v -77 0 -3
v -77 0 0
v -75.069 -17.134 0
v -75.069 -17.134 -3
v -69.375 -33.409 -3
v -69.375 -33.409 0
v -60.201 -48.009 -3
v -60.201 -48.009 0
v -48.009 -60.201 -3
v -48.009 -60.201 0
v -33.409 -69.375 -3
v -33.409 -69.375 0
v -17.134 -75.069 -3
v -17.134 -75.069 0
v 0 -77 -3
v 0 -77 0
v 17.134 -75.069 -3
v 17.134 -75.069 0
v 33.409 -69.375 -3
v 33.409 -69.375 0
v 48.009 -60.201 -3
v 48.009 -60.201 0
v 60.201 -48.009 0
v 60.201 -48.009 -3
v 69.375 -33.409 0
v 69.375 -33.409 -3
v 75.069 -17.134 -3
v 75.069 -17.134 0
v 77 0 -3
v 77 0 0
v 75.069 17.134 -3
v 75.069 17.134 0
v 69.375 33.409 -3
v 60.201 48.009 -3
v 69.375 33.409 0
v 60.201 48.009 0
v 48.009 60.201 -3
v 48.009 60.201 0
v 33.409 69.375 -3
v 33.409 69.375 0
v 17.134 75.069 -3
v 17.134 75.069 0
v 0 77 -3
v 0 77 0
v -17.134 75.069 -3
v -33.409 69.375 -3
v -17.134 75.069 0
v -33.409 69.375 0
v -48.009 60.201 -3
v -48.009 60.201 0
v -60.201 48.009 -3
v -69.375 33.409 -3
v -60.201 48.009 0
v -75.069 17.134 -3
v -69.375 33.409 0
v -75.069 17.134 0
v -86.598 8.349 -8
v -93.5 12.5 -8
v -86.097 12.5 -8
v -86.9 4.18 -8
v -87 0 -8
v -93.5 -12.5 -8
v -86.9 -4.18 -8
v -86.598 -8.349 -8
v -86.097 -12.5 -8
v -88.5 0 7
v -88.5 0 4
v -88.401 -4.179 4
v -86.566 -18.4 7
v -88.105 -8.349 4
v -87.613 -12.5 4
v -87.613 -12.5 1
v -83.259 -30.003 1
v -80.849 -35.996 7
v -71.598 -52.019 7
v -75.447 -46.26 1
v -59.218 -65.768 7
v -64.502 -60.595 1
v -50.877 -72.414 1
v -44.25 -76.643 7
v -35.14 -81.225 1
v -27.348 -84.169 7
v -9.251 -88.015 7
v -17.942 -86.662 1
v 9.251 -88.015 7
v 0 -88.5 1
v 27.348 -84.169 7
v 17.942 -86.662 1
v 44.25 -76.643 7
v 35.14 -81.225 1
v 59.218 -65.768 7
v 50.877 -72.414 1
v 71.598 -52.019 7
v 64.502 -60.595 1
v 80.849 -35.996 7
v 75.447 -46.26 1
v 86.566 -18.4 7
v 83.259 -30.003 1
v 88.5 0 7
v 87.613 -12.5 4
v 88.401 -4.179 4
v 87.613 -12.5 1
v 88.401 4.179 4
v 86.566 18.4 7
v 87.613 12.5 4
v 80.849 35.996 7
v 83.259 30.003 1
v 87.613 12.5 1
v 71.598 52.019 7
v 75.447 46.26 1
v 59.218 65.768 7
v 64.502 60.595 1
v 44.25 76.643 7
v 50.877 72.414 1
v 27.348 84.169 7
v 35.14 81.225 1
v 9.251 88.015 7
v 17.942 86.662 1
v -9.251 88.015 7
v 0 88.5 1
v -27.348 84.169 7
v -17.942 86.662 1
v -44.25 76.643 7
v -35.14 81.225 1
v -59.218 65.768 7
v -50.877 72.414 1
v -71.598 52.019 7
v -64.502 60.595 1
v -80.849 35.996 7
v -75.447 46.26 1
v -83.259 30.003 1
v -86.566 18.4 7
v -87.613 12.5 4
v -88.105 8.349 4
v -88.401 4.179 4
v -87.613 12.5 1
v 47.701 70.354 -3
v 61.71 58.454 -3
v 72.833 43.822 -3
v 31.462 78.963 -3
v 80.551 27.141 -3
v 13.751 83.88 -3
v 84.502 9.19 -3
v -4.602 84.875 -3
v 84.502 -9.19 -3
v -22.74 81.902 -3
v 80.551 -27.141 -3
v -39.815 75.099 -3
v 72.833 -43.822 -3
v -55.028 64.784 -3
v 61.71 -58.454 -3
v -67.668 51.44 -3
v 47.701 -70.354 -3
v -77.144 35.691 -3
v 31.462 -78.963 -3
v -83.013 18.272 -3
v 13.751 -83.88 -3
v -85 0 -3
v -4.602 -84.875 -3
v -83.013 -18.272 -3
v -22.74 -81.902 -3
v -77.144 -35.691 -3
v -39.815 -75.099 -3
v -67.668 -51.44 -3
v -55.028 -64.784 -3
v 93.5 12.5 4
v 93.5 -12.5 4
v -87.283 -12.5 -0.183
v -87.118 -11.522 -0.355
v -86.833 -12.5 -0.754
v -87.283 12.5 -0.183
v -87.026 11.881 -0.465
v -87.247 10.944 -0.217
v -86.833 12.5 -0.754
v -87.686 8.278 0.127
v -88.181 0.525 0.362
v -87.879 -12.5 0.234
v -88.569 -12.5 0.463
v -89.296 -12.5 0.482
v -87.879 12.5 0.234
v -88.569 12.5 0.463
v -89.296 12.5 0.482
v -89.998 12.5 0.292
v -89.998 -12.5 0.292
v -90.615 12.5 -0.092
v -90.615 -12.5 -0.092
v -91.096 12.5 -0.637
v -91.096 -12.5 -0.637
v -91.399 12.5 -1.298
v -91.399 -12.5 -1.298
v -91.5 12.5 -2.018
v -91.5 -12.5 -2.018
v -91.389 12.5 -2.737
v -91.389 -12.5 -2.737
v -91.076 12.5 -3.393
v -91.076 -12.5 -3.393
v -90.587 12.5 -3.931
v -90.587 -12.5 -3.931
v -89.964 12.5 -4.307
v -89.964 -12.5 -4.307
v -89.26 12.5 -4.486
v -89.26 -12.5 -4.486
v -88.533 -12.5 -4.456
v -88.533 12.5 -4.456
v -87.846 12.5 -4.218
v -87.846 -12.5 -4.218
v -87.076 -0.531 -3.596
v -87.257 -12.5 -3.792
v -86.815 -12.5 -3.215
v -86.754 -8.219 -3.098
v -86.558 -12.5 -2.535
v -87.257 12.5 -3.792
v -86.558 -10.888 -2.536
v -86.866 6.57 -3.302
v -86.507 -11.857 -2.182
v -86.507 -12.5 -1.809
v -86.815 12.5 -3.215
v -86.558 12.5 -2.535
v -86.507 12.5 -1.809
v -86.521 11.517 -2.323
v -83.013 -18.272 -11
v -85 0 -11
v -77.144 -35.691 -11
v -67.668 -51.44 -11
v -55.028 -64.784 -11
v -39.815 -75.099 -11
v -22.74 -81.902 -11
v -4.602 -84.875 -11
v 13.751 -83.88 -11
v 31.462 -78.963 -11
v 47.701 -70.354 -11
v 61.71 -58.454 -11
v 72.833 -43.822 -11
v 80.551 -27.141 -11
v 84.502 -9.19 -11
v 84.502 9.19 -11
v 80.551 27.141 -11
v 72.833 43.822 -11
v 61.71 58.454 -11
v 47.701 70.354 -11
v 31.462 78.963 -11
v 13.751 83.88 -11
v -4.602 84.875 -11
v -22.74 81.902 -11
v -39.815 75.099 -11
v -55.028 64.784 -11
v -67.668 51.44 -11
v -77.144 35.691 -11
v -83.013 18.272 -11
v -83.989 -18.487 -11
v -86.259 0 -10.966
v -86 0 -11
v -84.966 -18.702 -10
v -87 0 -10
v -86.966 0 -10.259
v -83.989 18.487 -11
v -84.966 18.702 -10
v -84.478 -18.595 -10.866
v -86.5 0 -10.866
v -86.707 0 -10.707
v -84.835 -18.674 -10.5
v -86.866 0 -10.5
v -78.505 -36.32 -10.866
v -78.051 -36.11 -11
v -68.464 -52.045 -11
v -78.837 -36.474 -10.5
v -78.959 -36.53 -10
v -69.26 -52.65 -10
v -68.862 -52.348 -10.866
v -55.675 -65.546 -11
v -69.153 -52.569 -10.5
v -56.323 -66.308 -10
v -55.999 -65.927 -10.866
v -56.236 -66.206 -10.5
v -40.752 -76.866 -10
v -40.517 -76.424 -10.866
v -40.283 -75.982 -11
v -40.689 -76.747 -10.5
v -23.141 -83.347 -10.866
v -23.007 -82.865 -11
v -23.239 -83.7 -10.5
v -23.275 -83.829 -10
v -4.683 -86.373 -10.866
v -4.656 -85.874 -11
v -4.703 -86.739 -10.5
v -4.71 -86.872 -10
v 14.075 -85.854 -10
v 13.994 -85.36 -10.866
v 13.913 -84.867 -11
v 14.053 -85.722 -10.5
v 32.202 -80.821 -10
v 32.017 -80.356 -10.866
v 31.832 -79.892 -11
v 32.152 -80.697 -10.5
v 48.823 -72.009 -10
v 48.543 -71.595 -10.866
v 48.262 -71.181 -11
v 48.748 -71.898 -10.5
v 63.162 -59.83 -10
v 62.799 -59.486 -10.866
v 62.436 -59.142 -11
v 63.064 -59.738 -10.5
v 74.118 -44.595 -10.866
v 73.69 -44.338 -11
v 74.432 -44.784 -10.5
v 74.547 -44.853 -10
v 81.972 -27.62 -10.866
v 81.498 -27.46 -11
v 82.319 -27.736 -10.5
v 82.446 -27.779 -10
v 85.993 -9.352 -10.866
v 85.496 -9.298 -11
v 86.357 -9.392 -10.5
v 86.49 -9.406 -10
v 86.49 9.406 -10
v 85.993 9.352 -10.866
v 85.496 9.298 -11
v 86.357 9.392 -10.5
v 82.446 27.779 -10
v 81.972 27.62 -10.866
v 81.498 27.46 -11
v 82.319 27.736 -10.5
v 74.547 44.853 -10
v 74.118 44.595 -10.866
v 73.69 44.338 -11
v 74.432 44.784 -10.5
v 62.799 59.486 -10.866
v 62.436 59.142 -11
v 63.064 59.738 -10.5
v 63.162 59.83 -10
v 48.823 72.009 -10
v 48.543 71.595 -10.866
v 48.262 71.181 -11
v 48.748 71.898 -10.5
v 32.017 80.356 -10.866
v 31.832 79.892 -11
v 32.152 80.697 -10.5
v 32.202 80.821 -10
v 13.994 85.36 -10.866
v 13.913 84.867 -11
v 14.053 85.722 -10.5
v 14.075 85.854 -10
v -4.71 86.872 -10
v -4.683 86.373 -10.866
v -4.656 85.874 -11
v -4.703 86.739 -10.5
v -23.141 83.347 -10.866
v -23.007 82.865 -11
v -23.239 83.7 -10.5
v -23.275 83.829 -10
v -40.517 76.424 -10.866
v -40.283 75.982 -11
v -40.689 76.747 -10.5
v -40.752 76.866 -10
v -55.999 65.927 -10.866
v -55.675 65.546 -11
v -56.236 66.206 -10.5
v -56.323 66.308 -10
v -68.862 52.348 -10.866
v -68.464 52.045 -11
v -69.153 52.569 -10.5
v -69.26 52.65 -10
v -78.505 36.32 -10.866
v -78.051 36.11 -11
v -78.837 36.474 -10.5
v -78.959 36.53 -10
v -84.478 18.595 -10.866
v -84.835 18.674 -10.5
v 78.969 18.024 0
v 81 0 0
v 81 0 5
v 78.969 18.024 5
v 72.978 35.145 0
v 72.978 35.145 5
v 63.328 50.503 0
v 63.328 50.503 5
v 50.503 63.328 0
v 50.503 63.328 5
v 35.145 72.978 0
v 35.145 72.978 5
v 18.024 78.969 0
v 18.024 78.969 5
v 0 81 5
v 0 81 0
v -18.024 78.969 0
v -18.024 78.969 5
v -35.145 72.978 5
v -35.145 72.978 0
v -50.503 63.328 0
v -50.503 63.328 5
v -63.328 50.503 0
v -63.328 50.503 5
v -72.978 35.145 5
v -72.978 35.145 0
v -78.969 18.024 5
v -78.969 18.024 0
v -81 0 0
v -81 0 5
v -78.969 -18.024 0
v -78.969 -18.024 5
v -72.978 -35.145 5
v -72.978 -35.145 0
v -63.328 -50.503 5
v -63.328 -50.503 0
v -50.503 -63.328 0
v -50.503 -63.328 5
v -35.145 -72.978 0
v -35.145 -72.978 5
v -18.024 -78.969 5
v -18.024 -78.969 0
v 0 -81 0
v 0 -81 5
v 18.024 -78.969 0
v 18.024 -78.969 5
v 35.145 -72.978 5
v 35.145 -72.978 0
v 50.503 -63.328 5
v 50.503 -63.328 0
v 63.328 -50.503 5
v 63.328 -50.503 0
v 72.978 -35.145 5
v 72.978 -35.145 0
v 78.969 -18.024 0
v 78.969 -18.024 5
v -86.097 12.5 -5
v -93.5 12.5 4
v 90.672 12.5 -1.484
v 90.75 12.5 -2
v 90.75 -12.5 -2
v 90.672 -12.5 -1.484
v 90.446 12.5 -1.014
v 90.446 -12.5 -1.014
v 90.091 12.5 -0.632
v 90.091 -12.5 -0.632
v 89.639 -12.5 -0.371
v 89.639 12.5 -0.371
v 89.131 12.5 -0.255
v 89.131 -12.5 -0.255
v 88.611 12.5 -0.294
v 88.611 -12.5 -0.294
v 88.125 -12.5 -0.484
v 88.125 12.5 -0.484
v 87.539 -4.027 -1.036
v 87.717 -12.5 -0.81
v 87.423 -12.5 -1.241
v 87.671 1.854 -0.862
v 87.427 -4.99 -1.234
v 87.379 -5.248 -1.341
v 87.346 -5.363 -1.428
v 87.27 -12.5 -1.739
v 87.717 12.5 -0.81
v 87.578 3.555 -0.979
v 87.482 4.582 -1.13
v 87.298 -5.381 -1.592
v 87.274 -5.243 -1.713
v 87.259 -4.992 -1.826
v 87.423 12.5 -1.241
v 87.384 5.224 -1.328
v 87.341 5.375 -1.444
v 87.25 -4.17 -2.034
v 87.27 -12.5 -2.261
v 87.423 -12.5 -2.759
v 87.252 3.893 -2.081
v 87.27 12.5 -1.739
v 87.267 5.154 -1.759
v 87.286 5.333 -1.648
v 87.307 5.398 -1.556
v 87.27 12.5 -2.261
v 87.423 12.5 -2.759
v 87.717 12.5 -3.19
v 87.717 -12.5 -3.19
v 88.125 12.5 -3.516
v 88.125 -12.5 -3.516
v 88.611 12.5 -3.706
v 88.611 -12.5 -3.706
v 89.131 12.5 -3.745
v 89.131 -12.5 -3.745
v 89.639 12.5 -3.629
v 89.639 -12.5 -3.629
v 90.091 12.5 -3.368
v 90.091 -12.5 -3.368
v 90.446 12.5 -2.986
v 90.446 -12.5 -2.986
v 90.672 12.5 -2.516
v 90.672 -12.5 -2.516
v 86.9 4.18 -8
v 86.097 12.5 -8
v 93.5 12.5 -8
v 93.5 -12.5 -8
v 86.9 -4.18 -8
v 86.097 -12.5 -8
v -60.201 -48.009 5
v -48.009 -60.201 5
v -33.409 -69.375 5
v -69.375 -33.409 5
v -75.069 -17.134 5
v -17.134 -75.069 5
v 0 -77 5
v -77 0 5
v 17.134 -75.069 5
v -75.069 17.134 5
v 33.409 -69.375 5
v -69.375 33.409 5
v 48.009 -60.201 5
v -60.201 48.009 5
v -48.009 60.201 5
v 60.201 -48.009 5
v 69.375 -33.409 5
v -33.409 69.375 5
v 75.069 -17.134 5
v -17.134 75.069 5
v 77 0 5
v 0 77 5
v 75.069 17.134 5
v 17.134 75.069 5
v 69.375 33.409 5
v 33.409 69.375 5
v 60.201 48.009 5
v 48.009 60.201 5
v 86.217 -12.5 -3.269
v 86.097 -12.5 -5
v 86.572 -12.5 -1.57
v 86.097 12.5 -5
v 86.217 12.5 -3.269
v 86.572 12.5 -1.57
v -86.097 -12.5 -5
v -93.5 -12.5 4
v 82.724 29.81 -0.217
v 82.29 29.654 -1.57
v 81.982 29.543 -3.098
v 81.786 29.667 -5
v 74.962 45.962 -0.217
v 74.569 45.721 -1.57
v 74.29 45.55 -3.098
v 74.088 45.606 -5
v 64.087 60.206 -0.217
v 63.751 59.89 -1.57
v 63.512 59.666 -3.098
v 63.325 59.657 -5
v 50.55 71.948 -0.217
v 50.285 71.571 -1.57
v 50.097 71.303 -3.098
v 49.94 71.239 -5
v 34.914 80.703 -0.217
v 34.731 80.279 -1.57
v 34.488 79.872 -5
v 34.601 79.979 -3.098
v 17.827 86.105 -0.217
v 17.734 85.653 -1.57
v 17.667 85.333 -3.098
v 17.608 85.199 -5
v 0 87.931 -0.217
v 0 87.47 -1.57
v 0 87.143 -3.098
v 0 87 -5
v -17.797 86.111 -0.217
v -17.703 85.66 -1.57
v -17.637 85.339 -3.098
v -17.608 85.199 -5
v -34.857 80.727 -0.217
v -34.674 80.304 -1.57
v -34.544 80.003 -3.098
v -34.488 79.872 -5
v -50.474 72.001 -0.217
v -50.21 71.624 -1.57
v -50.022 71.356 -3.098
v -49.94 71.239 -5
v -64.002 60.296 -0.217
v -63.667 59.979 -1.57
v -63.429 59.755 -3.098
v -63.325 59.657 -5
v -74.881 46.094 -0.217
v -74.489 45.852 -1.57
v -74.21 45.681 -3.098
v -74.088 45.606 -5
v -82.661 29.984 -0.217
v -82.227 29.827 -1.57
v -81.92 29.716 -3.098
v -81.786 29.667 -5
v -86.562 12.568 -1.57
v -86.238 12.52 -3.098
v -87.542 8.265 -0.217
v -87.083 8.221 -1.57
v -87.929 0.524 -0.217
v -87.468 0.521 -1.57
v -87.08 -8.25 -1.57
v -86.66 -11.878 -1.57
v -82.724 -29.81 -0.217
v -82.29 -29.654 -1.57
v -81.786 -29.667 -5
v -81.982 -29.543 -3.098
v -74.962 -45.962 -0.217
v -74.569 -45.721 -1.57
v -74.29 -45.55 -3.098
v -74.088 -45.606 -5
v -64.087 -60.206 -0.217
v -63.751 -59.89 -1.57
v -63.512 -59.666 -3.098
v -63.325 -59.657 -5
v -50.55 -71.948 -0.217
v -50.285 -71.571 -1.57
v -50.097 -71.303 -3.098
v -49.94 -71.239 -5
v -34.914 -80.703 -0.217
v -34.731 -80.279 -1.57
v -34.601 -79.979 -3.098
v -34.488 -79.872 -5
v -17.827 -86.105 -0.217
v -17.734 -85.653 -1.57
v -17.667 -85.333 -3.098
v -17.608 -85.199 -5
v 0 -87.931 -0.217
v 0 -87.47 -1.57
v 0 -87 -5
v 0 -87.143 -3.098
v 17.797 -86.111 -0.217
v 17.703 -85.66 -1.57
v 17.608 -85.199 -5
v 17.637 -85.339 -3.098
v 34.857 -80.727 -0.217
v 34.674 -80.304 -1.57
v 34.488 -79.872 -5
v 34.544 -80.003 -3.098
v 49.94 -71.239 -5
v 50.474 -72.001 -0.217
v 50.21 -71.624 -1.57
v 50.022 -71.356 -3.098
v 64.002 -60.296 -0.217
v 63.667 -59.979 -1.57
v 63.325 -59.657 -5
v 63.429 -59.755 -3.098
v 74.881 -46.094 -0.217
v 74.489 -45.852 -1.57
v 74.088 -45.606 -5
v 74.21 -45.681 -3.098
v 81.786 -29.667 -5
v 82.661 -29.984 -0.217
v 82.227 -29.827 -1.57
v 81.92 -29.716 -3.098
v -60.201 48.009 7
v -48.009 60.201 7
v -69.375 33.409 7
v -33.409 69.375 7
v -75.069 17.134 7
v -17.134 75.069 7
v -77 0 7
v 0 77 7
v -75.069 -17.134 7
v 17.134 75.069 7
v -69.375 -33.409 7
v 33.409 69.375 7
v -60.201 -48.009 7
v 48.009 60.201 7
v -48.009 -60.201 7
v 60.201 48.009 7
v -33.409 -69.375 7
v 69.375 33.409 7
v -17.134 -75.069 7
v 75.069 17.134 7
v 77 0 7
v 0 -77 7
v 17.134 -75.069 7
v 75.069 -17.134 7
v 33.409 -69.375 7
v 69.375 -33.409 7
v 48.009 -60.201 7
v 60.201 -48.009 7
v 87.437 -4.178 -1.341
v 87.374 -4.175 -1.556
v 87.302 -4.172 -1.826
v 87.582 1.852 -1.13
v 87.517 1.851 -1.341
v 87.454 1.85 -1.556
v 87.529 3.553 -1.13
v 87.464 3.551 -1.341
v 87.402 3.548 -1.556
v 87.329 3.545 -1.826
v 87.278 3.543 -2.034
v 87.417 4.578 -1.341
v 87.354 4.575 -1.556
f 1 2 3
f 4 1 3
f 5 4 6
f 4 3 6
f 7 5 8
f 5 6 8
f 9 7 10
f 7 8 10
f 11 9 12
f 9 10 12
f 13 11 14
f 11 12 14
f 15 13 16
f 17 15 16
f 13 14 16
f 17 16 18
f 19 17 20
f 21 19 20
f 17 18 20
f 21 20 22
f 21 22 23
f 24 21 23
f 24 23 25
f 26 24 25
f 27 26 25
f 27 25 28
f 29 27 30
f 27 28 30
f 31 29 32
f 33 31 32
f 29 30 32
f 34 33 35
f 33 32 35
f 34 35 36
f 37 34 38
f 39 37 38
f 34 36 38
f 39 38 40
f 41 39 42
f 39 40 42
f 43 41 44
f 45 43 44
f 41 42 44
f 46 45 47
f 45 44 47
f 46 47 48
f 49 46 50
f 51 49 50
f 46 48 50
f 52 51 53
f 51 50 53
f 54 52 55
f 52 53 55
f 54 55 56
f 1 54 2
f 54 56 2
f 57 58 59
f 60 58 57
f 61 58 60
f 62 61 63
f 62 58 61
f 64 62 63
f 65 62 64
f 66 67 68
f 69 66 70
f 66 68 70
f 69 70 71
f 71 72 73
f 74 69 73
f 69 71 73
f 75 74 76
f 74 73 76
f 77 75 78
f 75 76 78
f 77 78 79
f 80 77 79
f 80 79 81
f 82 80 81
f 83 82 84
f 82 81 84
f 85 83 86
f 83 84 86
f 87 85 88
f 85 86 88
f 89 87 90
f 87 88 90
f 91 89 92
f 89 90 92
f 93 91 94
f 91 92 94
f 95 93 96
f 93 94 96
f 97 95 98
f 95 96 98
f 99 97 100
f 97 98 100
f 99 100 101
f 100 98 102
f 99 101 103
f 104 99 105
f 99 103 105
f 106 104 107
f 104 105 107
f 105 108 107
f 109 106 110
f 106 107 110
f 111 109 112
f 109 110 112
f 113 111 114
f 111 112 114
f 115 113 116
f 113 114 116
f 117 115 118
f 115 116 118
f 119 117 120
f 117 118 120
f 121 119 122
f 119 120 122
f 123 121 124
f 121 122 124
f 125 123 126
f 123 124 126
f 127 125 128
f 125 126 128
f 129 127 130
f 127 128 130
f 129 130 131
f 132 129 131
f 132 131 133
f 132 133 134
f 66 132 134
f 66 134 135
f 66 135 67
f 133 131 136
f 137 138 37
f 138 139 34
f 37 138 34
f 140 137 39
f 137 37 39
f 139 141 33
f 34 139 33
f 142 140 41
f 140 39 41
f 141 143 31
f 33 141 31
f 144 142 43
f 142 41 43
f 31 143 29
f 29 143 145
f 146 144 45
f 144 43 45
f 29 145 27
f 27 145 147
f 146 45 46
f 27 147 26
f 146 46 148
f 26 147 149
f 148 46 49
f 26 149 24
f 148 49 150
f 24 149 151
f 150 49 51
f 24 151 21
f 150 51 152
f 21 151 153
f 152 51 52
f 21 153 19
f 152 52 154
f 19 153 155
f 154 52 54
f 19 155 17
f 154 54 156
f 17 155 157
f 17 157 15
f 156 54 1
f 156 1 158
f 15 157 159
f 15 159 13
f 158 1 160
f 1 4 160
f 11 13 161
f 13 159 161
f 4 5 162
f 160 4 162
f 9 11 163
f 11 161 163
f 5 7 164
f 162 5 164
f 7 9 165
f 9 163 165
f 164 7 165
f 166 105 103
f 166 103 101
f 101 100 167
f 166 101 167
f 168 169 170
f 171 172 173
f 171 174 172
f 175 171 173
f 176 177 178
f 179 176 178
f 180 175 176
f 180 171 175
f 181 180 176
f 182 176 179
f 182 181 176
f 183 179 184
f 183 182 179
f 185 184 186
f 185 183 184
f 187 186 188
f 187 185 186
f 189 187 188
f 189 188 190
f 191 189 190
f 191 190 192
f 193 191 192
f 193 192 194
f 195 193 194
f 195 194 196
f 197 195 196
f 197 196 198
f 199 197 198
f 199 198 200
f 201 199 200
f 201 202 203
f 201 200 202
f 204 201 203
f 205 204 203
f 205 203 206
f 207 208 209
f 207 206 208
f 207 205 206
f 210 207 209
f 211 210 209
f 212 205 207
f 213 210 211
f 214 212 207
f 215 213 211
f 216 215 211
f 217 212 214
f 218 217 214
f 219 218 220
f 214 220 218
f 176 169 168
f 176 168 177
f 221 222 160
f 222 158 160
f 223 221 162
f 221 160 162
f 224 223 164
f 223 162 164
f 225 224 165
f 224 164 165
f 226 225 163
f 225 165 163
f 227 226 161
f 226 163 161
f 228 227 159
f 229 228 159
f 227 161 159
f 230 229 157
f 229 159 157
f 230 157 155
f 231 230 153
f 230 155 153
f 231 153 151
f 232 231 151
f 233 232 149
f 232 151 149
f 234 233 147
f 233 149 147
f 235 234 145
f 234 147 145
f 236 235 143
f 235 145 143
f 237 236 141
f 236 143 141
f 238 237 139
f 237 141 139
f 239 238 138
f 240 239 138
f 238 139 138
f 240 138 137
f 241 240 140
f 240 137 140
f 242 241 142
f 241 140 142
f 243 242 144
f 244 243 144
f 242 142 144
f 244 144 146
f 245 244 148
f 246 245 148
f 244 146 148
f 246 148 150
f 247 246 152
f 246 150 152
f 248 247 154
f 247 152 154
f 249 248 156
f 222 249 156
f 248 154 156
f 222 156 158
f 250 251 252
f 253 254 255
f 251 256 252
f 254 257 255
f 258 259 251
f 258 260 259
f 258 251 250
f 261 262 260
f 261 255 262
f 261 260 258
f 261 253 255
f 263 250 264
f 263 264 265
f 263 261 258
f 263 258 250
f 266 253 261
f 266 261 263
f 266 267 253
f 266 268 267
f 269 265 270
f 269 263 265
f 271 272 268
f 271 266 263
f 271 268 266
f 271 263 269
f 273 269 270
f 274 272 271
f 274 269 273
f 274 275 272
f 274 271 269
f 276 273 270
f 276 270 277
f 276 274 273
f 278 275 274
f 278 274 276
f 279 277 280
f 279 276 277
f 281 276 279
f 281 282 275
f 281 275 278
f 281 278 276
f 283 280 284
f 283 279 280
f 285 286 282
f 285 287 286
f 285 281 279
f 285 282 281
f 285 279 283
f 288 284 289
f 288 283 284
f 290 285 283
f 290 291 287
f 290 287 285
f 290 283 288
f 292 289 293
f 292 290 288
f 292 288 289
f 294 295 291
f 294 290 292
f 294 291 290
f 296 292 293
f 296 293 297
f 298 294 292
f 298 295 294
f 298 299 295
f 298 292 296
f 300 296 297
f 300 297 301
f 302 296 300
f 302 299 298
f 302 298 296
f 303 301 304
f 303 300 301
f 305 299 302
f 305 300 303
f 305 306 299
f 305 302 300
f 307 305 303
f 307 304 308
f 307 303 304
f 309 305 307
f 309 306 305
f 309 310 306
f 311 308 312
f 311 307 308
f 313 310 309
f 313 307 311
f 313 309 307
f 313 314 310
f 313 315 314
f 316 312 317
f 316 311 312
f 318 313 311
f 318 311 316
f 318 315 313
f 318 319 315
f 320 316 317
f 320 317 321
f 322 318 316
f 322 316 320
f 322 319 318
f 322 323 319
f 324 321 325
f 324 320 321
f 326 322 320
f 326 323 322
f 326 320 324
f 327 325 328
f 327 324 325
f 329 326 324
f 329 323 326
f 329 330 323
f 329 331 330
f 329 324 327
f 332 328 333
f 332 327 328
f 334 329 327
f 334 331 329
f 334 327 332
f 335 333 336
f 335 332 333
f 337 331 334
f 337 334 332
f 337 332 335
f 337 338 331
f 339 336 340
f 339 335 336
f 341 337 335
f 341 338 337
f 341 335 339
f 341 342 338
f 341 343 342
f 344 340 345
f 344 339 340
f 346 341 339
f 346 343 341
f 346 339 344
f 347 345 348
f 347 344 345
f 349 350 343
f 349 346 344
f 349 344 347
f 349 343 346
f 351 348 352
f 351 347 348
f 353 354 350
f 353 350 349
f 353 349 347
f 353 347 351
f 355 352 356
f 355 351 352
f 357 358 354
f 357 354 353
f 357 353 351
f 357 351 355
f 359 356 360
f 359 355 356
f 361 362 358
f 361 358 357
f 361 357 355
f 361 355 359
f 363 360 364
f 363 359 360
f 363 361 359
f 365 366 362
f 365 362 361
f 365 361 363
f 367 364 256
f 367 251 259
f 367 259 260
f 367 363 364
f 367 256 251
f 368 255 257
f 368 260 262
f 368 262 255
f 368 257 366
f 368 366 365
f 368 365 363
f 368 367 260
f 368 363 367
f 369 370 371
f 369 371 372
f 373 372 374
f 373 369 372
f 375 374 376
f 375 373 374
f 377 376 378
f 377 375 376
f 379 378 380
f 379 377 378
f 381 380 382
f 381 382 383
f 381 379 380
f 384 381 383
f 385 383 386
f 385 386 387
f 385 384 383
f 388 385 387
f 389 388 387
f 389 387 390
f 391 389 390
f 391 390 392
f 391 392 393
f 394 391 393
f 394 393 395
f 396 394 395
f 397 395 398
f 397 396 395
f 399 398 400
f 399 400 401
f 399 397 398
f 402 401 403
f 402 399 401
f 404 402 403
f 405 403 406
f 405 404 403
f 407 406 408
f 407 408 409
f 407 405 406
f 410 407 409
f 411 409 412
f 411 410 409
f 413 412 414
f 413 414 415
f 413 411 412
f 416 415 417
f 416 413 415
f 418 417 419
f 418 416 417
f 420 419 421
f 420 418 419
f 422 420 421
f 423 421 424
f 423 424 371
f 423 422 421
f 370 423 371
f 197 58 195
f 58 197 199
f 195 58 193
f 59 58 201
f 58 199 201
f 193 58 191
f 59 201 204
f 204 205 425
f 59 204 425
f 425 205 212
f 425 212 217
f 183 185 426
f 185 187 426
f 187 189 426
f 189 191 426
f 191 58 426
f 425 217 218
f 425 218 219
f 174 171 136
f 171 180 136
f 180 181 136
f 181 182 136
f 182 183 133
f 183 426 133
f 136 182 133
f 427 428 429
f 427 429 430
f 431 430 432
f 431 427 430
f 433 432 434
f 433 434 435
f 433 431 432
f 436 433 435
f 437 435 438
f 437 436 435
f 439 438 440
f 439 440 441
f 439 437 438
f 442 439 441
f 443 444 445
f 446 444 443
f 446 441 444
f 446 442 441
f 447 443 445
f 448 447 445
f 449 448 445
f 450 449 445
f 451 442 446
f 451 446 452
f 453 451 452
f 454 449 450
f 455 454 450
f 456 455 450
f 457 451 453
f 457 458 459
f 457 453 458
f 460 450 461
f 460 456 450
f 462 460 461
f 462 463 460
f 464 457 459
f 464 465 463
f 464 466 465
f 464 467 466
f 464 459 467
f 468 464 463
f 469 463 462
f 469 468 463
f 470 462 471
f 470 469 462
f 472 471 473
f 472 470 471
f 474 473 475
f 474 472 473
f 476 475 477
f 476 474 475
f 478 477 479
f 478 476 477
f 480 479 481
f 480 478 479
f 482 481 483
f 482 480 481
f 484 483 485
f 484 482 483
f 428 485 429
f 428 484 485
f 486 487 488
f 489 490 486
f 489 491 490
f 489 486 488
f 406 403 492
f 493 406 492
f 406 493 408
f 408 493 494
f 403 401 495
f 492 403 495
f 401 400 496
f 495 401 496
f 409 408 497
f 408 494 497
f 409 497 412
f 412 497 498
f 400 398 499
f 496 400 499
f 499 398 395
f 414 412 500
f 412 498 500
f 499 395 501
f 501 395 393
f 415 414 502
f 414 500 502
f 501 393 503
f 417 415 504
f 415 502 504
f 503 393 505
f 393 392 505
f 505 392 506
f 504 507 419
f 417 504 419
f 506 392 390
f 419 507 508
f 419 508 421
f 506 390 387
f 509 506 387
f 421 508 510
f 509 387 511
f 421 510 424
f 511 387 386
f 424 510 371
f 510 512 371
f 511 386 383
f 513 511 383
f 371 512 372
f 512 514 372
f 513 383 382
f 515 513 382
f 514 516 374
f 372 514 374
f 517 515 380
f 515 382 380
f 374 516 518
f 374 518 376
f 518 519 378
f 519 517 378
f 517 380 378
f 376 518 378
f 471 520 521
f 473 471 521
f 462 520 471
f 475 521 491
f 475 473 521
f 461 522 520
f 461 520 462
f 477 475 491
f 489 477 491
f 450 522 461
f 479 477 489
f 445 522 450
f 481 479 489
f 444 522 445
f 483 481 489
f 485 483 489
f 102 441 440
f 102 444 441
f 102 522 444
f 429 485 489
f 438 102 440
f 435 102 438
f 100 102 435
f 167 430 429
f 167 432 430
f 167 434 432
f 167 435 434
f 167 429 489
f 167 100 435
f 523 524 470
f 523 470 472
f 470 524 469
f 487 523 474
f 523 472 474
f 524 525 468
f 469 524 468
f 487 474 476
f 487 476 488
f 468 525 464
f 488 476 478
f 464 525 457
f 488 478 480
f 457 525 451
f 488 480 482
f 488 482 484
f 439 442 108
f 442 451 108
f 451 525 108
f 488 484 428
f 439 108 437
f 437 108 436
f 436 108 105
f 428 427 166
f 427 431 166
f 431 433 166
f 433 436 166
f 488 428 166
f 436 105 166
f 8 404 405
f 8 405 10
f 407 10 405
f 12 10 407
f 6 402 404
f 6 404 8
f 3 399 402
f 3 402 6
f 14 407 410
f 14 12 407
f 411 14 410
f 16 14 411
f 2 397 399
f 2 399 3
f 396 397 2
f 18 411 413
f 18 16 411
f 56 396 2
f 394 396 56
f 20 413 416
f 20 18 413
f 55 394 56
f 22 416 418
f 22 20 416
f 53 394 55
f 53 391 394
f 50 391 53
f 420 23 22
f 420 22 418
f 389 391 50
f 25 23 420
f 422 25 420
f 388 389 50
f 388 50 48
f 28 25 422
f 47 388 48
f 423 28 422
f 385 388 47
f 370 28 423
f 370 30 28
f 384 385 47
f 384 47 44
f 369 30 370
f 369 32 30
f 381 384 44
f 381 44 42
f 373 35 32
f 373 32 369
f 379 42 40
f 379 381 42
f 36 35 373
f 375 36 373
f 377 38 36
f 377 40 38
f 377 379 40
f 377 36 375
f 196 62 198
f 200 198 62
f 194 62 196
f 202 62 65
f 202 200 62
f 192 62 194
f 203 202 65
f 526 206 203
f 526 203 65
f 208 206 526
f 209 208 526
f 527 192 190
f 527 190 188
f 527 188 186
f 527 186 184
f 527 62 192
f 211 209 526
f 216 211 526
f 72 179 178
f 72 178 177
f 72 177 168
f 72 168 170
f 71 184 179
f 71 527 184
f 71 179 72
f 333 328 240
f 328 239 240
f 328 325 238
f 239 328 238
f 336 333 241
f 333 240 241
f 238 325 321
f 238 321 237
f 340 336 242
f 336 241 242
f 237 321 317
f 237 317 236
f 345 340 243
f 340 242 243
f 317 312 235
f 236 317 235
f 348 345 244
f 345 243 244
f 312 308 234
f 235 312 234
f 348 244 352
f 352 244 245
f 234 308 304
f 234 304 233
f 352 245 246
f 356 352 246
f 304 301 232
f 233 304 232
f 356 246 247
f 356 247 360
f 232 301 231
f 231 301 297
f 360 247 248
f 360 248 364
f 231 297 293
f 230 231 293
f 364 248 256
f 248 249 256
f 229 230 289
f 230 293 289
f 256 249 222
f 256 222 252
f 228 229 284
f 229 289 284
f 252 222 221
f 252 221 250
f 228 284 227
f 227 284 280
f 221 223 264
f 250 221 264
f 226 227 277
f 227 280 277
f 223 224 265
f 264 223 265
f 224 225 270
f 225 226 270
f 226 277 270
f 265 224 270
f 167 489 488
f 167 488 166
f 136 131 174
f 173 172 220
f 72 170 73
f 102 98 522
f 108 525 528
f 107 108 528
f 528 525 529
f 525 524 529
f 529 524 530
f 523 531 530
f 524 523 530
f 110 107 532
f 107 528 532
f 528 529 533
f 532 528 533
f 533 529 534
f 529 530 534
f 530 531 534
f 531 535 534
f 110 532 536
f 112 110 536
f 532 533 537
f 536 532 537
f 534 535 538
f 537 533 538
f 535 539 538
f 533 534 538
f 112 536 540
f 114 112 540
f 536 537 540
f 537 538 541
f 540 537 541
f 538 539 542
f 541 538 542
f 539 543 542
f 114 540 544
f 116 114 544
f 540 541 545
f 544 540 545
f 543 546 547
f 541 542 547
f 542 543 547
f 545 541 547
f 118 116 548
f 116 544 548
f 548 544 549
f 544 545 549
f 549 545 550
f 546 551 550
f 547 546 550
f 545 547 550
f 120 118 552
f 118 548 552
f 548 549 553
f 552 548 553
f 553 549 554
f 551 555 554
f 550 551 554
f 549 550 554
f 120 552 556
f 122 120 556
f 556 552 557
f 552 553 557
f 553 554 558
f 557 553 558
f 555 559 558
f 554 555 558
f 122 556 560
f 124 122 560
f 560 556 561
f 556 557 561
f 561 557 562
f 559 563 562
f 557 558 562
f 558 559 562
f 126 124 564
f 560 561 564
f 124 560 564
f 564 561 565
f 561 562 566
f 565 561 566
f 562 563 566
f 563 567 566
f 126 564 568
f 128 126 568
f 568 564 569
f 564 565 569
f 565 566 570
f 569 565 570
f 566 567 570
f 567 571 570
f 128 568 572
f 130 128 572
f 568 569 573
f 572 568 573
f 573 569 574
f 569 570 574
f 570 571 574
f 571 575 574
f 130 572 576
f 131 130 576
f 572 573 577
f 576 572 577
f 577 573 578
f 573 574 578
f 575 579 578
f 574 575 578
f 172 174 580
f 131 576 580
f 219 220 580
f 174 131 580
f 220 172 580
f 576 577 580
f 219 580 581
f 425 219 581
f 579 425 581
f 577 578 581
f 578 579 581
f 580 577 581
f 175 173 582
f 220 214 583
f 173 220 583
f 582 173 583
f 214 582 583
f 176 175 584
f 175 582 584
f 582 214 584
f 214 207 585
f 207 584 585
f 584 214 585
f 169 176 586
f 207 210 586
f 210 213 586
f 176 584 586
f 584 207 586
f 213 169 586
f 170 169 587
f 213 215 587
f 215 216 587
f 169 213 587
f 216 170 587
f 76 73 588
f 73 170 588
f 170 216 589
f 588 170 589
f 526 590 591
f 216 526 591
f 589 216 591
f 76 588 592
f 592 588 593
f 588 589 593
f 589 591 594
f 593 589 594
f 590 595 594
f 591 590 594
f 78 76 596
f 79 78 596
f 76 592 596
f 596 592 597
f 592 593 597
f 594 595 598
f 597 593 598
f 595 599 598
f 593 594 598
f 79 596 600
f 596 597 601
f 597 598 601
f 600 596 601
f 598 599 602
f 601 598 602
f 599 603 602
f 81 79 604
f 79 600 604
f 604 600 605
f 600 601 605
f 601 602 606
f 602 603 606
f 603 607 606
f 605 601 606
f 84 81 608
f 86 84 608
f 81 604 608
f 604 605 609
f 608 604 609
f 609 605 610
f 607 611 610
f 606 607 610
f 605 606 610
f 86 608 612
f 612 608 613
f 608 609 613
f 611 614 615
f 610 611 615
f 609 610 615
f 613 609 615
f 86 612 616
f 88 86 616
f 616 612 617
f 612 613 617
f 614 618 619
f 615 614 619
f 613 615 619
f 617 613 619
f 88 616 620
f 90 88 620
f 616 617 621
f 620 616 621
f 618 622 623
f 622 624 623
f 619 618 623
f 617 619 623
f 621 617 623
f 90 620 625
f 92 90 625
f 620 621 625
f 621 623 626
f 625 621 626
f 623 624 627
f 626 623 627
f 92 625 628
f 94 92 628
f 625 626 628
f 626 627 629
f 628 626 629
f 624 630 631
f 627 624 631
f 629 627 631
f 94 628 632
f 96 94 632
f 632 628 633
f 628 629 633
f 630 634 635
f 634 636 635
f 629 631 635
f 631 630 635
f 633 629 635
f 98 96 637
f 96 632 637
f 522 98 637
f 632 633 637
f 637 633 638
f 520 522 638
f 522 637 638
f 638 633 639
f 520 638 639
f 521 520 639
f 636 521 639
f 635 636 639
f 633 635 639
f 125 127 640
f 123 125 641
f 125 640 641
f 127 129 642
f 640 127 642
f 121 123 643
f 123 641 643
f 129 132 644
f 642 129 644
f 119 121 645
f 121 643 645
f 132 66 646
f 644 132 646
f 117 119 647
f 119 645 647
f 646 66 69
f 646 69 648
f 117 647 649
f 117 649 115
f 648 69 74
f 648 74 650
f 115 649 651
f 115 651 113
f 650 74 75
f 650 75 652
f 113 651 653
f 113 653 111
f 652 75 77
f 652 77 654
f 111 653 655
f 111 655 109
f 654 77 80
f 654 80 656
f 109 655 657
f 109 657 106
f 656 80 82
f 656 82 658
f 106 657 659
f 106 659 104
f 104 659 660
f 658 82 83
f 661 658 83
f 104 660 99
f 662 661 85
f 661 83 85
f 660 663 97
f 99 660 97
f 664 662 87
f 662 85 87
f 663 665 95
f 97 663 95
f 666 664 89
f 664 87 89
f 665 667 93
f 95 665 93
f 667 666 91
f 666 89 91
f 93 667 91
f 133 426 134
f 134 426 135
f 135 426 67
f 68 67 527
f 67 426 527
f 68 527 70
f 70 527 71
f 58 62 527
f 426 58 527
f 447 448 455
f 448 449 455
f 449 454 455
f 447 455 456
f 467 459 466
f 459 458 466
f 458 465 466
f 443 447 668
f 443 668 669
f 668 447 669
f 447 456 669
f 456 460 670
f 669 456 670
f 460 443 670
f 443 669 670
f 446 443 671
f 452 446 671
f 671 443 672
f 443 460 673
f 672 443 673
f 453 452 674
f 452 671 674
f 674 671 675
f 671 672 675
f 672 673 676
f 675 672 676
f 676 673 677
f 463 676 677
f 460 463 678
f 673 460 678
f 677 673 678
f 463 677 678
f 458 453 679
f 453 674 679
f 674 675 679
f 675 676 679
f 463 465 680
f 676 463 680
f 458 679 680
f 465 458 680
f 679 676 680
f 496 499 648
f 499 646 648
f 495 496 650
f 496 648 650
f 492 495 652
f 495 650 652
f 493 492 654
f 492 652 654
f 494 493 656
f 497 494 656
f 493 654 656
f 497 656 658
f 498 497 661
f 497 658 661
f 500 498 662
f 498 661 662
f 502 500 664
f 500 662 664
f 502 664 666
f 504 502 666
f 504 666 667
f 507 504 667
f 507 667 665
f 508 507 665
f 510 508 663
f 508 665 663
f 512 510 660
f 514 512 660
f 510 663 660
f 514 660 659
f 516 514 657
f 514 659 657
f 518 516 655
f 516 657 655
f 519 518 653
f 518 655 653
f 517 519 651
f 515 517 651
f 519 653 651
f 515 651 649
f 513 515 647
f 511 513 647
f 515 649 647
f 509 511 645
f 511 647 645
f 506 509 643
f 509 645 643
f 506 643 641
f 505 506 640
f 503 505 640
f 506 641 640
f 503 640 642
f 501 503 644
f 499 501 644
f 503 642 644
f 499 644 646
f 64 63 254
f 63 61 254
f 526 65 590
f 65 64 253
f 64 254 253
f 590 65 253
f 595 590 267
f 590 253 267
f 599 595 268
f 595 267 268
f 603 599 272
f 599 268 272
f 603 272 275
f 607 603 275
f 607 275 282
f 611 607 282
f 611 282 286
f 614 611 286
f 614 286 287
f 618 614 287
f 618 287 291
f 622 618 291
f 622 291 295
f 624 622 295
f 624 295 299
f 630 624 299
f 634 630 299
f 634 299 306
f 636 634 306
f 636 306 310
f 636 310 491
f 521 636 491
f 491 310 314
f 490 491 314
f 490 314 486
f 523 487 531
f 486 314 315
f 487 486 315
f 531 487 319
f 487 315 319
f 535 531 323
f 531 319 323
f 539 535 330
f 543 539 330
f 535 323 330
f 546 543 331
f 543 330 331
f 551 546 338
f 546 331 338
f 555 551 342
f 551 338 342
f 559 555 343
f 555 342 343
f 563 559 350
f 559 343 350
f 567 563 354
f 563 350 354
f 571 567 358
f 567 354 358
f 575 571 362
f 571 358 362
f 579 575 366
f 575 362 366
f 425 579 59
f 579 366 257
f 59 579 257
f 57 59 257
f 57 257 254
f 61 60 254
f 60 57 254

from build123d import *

# Parameters (mm, degrees)
F2_R     = 81
F3_DEPTH = 5
F4_R     = 1
F5_W     = 8
F5_H     = 12
F5_R     = 2.5
F7_DEPTH = 12.5
F6_W     = 8
F6_H     = 12
F6_R     = 1.75
F8_DEPTH = 12.5


with BuildPart() as f1:
    # F0 (on Front) → F1 (revolve)
    with BuildSketch(Plane.XZ):
        with BuildLine():
            Line((-85, -3), (-77, -3))
            Line((-77, -3), (-77, 0))
            Line((-77, 0), (-77, 7))
            Line((-77, 7), (-88.5, 7))
            Line((-88.5, 7), (-88.5, 1))
            ThreePointArc((-88.5, 1), (-87.380683, -1.907671), (-87, -5))
            Line((-87, -5), (-87, -11))
            Line((-87, -11), (-85, -11))
            Line((-85, -11), (-85, -3))
        make_face()
    revolve(axis=Axis((0, 0, -0.2651), (0, 0, 1)))

    # F2 (on Top) → F3 (cut)
    with BuildSketch(Plane.XY):
        Circle(F2_R)
    extrude(amount=F3_DEPTH, mode=Mode.SUBTRACT)

    # F4
    f4_edges = [f1.edges().sort_by_distance(p)[0] for p in [
        (87, 0, -11),
    ]]
    fillet(f4_edges, radius=F4_R)

    # F5 (on Front) → F7 (join, symmetric)
    with BuildSketch(Plane.XZ):
        with Locations((-89.5, -2)):
            Rectangle(F5_W, F5_H)
        with Locations((-89, -2)):
            Circle(F5_R, mode=Mode.SUBTRACT)
    extrude(amount=F7_DEPTH, both=True)

    # F6 (on Front) → F8 (join, symmetric)
    with BuildSketch(Plane.XZ):
        with Locations((89.5, -2)):
            Rectangle(F6_W, F6_H)
        with Locations((89, -2)):
            Circle(F6_R, mode=Mode.SUBTRACT)
    extrude(amount=F8_DEPTH, both=True)


solid = f1.part
